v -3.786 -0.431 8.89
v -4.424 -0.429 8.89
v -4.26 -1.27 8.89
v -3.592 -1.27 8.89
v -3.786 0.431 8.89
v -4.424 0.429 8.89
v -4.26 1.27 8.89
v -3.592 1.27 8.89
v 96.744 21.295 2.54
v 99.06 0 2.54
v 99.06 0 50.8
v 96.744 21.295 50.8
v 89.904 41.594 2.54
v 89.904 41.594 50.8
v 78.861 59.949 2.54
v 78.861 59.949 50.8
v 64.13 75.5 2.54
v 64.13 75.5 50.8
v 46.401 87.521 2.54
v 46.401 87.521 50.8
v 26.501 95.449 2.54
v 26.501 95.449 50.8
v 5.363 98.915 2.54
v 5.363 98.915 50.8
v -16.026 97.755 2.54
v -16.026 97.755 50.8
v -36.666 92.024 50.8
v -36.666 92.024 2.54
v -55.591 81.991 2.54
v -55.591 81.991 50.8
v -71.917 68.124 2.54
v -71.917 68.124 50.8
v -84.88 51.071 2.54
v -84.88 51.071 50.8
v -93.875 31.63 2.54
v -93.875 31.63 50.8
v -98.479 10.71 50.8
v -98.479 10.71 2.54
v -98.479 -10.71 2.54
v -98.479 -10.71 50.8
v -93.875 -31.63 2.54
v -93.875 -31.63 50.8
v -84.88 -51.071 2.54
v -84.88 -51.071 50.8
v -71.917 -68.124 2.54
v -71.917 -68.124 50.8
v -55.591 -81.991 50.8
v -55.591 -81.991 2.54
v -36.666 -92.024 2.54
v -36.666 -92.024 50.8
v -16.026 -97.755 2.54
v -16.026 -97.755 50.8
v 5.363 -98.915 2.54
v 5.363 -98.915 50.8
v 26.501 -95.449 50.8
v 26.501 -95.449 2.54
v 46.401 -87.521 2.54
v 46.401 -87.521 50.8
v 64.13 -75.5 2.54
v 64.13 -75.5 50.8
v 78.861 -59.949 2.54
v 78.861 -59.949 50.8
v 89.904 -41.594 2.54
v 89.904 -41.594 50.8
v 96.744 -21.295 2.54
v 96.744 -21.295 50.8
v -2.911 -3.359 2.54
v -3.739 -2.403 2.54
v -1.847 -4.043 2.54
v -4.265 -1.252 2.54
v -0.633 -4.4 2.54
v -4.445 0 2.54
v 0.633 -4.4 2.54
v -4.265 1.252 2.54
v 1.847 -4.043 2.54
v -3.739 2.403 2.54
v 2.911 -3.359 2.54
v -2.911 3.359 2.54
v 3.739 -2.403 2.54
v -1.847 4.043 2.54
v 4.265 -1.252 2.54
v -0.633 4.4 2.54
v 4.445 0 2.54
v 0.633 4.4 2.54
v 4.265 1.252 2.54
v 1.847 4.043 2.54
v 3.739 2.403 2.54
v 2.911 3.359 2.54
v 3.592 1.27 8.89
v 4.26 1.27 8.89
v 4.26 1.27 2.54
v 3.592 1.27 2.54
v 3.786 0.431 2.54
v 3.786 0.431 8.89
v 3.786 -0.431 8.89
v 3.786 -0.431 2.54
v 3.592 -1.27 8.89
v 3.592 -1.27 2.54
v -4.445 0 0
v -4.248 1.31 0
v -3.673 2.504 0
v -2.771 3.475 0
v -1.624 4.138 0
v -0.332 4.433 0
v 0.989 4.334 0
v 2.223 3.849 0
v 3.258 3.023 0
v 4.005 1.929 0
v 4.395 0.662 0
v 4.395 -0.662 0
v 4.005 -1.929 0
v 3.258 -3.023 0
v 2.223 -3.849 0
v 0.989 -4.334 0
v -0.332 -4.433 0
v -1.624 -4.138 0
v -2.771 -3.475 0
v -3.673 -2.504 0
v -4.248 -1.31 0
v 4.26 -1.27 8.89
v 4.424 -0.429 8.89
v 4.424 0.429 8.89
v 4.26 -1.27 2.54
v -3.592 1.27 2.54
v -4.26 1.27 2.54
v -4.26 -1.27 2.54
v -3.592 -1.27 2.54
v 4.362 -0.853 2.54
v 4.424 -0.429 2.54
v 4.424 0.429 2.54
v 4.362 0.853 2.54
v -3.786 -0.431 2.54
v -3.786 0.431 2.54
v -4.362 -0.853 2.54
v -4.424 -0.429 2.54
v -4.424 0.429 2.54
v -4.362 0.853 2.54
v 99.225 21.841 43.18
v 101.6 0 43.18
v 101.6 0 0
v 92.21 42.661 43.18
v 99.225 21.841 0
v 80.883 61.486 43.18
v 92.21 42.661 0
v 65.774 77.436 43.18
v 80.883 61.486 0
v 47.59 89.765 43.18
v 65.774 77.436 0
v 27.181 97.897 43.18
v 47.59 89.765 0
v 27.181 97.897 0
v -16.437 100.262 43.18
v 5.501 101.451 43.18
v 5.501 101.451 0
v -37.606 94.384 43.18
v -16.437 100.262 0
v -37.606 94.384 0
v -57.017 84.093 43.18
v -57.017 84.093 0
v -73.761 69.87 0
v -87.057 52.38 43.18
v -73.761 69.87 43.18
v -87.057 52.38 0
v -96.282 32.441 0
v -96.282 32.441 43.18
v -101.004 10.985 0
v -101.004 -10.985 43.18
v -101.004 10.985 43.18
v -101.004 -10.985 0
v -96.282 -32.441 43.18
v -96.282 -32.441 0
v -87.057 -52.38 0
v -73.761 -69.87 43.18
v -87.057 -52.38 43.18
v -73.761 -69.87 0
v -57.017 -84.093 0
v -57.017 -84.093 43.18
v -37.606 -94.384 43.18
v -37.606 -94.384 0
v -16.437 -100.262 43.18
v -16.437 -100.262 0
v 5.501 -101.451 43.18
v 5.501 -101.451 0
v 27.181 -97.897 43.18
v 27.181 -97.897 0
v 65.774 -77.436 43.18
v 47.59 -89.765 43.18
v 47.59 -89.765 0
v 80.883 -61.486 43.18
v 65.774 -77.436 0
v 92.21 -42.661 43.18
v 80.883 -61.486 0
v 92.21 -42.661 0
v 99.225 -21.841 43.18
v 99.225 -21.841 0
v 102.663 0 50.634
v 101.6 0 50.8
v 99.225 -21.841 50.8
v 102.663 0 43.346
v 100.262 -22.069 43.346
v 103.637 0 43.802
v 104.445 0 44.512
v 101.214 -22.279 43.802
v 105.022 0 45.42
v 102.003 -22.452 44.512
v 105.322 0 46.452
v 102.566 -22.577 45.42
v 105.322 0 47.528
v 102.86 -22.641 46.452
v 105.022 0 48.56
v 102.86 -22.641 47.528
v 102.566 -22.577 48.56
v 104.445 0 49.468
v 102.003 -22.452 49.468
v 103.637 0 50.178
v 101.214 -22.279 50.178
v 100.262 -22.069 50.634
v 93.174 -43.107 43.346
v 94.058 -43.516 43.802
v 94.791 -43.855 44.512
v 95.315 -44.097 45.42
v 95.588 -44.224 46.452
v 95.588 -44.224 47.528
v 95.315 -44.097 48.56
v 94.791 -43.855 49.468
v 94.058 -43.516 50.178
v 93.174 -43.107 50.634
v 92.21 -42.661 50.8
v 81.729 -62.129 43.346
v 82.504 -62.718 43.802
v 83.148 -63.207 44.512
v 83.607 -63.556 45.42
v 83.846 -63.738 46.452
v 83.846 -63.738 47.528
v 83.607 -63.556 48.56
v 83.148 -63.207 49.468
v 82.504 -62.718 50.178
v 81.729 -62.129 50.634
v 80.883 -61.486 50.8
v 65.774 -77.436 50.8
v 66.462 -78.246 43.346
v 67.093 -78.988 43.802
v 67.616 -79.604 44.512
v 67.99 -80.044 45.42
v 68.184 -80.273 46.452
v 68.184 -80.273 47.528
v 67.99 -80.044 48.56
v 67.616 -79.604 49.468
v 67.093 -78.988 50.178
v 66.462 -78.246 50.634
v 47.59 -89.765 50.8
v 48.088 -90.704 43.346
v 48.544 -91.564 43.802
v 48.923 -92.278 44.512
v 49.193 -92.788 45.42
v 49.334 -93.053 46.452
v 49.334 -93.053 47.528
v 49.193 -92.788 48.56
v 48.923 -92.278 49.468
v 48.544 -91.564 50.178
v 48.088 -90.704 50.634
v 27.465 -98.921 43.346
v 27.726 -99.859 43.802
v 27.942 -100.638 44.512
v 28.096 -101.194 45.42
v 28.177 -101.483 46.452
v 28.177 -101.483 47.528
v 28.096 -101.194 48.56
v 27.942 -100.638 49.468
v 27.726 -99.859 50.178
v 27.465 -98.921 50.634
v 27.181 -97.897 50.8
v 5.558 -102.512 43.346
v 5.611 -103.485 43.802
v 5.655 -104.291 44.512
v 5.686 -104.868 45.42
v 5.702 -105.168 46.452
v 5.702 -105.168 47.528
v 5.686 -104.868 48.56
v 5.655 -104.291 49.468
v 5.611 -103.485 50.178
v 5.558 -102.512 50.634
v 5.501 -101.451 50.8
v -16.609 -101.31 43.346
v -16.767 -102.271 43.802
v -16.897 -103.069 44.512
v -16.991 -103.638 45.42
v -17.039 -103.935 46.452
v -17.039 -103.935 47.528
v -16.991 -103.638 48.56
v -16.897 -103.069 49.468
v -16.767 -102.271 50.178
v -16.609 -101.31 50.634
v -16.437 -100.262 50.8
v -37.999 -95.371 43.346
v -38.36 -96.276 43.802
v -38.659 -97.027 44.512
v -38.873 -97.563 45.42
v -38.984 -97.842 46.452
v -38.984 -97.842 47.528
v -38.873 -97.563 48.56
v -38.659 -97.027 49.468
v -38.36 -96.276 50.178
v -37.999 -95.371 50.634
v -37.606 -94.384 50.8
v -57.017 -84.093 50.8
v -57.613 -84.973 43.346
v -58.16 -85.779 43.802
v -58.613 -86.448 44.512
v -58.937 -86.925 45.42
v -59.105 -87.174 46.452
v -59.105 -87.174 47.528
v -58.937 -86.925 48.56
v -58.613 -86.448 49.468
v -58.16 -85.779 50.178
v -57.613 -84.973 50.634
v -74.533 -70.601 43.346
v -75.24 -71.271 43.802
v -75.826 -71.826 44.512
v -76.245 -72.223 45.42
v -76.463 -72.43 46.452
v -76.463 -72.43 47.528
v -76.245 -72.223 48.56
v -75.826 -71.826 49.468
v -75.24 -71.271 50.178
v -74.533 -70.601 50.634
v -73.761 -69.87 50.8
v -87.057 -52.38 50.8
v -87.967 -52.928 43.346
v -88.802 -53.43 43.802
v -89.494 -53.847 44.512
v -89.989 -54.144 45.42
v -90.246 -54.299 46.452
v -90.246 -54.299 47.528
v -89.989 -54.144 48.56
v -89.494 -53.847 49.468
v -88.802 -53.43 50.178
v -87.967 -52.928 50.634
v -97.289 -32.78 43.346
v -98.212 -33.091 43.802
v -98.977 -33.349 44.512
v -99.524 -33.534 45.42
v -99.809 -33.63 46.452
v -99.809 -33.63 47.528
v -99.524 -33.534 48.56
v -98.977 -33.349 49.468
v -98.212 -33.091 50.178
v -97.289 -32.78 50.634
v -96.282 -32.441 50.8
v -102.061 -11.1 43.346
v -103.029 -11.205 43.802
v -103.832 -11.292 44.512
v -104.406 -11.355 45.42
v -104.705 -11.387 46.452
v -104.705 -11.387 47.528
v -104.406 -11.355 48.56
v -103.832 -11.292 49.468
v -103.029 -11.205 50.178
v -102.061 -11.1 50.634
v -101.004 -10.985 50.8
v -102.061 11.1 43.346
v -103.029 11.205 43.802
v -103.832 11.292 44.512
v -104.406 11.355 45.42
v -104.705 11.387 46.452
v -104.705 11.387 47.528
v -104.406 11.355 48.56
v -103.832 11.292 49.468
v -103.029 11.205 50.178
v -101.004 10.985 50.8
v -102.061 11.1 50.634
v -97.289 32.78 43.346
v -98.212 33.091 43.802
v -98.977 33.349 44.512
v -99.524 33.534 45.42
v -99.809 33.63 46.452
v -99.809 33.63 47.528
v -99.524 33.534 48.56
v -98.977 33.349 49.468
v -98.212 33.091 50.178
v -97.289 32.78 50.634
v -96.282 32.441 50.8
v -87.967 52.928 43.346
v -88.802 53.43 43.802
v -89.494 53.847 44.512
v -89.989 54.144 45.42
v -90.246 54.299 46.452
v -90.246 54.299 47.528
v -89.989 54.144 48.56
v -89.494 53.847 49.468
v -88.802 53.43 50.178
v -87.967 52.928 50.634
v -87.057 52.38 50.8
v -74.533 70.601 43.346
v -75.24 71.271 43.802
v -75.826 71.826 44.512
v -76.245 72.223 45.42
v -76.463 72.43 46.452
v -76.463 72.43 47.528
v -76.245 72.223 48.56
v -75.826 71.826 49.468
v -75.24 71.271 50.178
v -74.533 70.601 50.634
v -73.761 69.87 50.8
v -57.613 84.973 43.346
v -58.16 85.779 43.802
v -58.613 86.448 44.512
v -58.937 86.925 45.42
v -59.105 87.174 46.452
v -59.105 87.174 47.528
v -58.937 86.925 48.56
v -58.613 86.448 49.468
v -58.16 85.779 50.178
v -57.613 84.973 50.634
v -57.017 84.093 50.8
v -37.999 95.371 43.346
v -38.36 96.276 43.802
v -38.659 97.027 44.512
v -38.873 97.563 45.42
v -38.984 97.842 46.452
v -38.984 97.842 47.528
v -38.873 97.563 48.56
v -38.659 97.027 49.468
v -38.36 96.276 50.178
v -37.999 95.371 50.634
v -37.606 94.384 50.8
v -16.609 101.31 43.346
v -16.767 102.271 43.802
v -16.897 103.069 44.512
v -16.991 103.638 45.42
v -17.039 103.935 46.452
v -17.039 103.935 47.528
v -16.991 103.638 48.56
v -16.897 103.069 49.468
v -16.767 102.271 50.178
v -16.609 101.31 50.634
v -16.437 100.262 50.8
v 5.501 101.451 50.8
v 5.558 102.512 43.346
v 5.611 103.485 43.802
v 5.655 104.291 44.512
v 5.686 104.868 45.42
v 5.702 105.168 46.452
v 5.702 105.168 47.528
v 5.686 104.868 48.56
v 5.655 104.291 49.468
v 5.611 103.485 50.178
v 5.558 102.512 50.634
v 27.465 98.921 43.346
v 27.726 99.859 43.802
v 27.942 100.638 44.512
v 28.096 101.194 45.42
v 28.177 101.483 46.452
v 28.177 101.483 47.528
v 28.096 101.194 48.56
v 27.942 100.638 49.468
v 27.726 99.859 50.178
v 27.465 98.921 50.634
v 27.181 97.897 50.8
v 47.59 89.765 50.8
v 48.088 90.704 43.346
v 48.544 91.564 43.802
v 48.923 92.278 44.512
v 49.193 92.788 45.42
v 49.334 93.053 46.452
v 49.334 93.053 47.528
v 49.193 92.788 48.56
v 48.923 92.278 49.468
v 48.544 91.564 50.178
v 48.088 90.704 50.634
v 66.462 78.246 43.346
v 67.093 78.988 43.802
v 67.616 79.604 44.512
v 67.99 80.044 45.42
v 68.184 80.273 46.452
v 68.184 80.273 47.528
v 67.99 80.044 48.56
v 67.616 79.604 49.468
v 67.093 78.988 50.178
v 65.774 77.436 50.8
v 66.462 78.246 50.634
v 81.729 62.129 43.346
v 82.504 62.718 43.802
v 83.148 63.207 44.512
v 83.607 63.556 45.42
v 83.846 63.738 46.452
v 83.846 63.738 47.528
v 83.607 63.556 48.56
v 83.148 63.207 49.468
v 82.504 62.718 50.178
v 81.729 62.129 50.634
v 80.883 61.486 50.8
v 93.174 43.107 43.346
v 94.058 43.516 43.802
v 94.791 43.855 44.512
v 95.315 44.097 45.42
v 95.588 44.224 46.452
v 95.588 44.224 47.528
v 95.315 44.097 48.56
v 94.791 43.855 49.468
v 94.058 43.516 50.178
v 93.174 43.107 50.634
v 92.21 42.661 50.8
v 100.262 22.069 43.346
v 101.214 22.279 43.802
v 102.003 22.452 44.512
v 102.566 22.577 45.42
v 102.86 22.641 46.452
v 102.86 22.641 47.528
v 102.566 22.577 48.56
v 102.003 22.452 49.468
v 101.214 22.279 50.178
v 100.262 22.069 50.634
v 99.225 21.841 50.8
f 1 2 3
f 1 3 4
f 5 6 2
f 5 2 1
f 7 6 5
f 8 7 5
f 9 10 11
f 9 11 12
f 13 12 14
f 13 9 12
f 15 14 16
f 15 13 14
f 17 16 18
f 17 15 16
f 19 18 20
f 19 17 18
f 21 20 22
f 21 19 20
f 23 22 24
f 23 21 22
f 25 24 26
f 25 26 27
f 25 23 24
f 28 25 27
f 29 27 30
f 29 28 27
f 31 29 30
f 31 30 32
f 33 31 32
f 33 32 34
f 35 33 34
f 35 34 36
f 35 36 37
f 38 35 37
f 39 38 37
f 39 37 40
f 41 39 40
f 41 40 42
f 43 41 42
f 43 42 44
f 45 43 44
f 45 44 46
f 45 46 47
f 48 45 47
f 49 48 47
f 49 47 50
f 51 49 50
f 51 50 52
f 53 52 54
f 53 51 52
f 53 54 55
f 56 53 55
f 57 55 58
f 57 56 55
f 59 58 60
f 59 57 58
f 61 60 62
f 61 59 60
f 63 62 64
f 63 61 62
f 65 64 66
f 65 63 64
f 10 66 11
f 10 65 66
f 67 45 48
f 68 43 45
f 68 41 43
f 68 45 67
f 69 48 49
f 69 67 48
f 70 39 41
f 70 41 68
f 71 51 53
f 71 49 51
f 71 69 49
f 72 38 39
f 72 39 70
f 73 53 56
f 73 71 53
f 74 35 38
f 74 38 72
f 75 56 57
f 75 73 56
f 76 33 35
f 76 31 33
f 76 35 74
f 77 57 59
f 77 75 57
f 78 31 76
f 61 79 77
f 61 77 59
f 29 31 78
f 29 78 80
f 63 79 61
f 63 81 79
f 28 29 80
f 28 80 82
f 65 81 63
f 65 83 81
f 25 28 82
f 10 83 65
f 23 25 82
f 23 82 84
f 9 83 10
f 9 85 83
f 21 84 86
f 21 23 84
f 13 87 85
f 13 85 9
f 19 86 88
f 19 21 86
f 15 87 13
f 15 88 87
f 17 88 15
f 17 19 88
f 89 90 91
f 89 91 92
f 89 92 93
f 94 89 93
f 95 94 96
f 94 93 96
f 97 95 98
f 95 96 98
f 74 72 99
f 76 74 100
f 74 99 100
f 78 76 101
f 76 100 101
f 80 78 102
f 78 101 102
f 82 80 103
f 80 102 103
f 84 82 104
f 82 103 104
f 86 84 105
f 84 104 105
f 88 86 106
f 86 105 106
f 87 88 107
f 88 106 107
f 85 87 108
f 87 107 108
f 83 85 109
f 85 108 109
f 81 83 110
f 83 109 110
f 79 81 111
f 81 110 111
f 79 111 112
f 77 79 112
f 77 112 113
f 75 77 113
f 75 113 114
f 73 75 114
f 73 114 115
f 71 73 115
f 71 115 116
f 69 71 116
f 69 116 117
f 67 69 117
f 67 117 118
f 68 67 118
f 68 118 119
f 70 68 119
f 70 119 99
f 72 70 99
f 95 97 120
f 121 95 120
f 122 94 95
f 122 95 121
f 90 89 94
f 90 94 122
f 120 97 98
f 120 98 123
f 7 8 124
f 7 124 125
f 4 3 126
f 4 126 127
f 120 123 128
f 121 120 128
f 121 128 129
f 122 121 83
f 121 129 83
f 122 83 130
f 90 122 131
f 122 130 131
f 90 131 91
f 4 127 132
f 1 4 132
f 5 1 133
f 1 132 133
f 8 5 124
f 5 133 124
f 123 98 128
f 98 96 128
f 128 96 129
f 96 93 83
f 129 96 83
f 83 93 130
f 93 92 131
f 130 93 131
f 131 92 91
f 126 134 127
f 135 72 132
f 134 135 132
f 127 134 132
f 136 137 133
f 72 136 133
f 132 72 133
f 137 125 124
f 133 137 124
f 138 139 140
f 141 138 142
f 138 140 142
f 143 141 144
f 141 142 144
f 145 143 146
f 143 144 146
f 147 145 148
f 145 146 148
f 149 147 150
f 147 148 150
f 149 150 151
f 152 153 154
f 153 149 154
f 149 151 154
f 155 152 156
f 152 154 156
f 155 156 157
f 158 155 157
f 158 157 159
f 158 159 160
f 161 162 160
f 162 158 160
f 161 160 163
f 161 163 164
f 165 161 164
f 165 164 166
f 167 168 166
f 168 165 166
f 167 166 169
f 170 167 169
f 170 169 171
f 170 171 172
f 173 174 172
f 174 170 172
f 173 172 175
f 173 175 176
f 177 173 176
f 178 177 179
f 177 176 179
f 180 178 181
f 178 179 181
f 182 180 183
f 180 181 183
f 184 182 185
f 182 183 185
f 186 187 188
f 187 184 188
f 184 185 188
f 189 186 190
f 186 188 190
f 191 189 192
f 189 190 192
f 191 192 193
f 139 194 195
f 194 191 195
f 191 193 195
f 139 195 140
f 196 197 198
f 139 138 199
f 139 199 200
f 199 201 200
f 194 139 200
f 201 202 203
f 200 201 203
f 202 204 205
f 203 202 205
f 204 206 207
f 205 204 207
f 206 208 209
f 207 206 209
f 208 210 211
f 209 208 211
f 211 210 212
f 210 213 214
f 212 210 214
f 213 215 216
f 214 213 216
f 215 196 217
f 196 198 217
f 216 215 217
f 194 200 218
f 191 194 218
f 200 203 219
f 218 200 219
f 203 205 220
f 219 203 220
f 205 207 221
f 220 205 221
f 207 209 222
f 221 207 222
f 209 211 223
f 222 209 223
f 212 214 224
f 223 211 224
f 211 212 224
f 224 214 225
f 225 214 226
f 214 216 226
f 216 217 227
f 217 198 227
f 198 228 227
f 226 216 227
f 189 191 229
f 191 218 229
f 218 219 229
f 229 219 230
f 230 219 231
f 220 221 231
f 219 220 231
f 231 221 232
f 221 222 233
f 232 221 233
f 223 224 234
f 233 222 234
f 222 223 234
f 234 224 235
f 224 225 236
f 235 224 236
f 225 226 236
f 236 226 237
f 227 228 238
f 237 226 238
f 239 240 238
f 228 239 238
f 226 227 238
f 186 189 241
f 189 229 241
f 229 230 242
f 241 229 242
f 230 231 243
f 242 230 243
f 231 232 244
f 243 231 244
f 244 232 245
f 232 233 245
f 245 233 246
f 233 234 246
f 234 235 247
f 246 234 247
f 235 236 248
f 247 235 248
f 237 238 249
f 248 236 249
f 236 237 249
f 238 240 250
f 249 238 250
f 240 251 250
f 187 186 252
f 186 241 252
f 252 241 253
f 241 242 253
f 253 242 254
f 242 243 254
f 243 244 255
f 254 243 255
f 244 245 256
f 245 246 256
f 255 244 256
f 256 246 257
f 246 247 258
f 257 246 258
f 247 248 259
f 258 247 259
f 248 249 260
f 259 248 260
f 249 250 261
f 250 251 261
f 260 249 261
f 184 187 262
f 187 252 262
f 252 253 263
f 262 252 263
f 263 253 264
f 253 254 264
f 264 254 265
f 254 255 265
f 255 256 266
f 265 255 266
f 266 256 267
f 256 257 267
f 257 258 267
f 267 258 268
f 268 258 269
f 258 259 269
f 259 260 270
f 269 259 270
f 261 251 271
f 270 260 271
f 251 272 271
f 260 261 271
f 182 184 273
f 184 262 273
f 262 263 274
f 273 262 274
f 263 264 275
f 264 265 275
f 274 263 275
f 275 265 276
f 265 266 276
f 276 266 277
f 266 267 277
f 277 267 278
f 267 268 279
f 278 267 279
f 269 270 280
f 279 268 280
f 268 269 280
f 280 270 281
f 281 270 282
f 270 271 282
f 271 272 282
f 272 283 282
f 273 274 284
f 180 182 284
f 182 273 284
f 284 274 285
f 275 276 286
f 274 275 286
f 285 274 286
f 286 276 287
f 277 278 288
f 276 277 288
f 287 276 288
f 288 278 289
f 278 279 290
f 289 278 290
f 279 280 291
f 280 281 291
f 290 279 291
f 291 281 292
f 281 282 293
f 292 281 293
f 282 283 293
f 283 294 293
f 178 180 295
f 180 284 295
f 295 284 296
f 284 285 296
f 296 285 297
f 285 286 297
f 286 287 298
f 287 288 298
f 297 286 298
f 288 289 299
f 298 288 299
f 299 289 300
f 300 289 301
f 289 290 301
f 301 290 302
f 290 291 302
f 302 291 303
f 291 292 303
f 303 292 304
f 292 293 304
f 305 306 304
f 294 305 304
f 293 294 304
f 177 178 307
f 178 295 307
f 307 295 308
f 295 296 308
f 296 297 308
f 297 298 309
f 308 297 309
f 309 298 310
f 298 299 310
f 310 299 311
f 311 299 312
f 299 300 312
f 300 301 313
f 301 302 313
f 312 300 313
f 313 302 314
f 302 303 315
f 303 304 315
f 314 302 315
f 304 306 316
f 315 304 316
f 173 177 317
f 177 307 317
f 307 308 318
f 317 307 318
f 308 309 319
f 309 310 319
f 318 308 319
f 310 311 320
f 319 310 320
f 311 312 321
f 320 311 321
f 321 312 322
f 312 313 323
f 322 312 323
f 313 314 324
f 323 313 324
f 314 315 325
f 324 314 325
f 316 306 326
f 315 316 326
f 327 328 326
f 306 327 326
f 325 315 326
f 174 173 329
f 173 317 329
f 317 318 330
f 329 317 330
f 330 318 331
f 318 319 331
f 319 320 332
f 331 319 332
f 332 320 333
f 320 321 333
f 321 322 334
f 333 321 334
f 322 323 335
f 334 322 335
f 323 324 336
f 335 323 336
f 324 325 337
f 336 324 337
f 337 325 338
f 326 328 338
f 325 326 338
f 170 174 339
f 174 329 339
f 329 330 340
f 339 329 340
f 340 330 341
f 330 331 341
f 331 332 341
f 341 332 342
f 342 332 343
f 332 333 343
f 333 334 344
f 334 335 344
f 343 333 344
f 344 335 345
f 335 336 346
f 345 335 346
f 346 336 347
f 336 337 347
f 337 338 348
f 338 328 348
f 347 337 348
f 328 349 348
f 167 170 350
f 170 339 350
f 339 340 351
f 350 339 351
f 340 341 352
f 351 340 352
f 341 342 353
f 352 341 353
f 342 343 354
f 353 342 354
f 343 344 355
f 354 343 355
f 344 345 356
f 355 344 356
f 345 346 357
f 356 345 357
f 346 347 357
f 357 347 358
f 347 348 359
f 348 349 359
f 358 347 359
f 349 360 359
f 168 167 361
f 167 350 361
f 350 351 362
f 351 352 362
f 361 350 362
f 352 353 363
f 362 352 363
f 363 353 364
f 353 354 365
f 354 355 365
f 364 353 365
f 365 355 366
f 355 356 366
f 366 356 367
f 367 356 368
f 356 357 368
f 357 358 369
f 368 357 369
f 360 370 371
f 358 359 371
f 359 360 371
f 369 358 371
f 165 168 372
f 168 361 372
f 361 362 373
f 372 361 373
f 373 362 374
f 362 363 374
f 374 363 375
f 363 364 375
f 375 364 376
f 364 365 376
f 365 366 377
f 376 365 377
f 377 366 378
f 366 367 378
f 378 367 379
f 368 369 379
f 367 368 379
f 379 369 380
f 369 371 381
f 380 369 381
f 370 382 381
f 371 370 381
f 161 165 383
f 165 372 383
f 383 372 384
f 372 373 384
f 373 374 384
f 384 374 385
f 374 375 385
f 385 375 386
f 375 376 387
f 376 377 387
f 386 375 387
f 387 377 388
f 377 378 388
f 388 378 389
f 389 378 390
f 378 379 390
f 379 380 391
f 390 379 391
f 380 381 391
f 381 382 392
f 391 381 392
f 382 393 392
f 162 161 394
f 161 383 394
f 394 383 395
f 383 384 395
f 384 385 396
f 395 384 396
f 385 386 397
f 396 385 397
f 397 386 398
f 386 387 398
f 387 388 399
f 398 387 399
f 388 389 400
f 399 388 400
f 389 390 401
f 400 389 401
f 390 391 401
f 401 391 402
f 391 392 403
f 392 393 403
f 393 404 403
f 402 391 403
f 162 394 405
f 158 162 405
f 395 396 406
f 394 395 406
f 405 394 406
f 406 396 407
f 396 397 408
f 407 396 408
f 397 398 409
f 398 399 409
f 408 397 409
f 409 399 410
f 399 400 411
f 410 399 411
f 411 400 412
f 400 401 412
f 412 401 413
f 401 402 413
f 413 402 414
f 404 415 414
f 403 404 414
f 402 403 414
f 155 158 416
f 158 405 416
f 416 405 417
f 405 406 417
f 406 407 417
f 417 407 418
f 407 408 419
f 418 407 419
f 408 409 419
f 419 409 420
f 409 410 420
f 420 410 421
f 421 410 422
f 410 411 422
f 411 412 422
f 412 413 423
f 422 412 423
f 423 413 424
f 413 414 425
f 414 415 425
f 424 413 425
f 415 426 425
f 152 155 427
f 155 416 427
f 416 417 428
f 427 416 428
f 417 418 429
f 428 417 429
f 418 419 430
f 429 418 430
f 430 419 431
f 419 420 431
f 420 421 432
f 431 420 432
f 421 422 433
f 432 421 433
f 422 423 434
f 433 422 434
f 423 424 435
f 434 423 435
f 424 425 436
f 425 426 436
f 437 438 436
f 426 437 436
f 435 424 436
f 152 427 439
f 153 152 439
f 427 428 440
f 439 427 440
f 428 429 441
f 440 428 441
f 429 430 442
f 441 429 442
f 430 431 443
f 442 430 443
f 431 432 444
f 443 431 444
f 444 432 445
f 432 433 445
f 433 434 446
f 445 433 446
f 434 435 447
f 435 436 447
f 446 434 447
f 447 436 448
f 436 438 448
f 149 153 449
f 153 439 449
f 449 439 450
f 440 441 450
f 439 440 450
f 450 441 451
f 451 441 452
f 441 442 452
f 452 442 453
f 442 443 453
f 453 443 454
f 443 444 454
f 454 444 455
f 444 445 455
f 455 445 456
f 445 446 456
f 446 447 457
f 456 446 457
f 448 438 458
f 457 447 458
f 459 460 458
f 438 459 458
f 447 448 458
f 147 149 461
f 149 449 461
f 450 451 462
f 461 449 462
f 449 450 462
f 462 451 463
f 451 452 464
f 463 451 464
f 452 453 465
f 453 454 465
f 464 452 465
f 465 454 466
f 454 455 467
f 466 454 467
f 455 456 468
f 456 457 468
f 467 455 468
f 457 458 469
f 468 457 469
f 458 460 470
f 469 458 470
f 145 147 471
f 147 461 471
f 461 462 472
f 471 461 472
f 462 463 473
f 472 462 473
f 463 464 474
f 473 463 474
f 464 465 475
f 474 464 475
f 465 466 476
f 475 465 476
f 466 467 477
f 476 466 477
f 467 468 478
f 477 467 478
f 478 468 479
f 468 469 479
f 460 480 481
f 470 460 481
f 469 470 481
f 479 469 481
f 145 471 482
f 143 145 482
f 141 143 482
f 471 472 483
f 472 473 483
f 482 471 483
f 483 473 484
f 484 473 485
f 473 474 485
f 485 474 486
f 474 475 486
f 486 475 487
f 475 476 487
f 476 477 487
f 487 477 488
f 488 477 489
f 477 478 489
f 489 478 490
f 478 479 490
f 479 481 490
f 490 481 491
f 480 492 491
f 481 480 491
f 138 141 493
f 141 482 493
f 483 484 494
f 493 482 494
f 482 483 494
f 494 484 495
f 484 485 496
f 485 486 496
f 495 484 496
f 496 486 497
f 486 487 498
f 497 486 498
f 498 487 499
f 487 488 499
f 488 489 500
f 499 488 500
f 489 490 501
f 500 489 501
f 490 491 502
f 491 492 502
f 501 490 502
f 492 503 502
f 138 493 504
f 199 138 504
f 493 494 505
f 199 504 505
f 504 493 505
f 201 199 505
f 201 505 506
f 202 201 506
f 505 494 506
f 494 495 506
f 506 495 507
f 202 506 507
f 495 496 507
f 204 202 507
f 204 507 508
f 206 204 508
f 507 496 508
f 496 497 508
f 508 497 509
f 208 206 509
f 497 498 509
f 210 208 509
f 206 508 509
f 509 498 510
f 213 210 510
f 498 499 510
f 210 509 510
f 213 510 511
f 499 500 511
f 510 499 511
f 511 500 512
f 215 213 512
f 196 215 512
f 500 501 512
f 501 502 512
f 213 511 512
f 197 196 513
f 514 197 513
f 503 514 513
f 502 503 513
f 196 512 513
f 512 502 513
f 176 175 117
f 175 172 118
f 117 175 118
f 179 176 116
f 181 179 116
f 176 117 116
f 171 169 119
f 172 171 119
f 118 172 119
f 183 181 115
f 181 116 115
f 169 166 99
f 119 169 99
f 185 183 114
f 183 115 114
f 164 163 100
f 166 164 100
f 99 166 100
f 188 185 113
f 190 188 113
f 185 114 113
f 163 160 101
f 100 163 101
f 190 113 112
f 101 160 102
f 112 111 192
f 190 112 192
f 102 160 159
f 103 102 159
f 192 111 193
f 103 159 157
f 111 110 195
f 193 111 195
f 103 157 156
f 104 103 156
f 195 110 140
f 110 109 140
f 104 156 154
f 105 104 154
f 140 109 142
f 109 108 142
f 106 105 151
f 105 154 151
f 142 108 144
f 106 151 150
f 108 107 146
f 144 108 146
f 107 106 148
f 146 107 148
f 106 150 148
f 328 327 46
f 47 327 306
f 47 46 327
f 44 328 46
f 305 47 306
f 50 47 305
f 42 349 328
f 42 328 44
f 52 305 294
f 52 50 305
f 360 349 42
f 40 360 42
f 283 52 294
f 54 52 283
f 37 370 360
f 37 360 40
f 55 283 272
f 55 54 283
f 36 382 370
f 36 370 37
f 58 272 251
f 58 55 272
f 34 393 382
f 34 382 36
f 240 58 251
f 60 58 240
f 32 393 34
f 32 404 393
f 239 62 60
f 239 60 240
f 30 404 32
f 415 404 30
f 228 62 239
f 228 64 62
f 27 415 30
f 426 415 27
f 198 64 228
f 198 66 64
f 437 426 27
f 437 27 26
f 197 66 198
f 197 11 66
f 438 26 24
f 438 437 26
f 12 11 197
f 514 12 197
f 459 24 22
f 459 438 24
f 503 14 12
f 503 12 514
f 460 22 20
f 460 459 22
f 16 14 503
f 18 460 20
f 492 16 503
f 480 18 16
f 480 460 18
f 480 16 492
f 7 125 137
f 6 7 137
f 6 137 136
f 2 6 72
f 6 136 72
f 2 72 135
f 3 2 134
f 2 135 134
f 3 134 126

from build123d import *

# Parameters (mm, degrees)
F0_R     = 101.6
F1_DEPTH = 50.8
F2_T     = -2.54
F6_D     = 8.89
F8_DEPTH = 6.35


with BuildPart() as f1:
    # F0 (on Top) → F1 (new body)
    with BuildSketch(Plane.XY):
        Circle(F0_R)
    extrude(amount=F1_DEPTH)

    # F2
    f2_openings = [f1.faces().sort_by_distance(p)[0] for p in [
        (0, 0, 50.8),
    ]]
    offset(amount=F2_T, openings=f2_openings)

    # F3 (on Front) → F4 (revolve)
    with BuildSketch(Plane.XZ):
        with BuildLine():
            Line((101.6, 50.8), (101.6, 43.18))
            ThreePointArc((101.6, 43.18), (105.360366, 46.99), (101.6, 50.8))
        make_face()
    revolve(axis=Axis((0, 0, 25.40097), (0, 0, -1)))

    # F6 (through all)
    with Locations(Plane.XY.offset(2.54)):
        with Locations((0, 0)):
            Hole(F6_D / 2)

    # F7 (on face) → F8 (join)
    with BuildSketch(Plane.XY.offset(2.54)):
        with BuildLine():
            Line((-3.592102, 1.27), (-4.259709, 1.27))
            ThreePointArc((-4.259709, 1.27), (-4.445, 0), (-4.259709, -1.27))
            Line((-4.259709, -1.27), (-3.592102, -1.27))
            ThreePointArc((-3.592102, -1.27), (-3.81, 0), (-3.592102, 1.27))
        make_face()
        with BuildLine():
            Line((3.592102, -1.27), (4.259709, -1.27))
            ThreePointArc((4.259709, -1.27), (4.445, 0), (4.259709, 1.27))
            Line((4.259709, 1.27), (3.592102, 1.27))
            ThreePointArc((3.592102, 1.27), (3.81, 0), (3.592102, -1.27))
        make_face()
    extrude(amount=F8_DEPTH)


solid = f1.part
